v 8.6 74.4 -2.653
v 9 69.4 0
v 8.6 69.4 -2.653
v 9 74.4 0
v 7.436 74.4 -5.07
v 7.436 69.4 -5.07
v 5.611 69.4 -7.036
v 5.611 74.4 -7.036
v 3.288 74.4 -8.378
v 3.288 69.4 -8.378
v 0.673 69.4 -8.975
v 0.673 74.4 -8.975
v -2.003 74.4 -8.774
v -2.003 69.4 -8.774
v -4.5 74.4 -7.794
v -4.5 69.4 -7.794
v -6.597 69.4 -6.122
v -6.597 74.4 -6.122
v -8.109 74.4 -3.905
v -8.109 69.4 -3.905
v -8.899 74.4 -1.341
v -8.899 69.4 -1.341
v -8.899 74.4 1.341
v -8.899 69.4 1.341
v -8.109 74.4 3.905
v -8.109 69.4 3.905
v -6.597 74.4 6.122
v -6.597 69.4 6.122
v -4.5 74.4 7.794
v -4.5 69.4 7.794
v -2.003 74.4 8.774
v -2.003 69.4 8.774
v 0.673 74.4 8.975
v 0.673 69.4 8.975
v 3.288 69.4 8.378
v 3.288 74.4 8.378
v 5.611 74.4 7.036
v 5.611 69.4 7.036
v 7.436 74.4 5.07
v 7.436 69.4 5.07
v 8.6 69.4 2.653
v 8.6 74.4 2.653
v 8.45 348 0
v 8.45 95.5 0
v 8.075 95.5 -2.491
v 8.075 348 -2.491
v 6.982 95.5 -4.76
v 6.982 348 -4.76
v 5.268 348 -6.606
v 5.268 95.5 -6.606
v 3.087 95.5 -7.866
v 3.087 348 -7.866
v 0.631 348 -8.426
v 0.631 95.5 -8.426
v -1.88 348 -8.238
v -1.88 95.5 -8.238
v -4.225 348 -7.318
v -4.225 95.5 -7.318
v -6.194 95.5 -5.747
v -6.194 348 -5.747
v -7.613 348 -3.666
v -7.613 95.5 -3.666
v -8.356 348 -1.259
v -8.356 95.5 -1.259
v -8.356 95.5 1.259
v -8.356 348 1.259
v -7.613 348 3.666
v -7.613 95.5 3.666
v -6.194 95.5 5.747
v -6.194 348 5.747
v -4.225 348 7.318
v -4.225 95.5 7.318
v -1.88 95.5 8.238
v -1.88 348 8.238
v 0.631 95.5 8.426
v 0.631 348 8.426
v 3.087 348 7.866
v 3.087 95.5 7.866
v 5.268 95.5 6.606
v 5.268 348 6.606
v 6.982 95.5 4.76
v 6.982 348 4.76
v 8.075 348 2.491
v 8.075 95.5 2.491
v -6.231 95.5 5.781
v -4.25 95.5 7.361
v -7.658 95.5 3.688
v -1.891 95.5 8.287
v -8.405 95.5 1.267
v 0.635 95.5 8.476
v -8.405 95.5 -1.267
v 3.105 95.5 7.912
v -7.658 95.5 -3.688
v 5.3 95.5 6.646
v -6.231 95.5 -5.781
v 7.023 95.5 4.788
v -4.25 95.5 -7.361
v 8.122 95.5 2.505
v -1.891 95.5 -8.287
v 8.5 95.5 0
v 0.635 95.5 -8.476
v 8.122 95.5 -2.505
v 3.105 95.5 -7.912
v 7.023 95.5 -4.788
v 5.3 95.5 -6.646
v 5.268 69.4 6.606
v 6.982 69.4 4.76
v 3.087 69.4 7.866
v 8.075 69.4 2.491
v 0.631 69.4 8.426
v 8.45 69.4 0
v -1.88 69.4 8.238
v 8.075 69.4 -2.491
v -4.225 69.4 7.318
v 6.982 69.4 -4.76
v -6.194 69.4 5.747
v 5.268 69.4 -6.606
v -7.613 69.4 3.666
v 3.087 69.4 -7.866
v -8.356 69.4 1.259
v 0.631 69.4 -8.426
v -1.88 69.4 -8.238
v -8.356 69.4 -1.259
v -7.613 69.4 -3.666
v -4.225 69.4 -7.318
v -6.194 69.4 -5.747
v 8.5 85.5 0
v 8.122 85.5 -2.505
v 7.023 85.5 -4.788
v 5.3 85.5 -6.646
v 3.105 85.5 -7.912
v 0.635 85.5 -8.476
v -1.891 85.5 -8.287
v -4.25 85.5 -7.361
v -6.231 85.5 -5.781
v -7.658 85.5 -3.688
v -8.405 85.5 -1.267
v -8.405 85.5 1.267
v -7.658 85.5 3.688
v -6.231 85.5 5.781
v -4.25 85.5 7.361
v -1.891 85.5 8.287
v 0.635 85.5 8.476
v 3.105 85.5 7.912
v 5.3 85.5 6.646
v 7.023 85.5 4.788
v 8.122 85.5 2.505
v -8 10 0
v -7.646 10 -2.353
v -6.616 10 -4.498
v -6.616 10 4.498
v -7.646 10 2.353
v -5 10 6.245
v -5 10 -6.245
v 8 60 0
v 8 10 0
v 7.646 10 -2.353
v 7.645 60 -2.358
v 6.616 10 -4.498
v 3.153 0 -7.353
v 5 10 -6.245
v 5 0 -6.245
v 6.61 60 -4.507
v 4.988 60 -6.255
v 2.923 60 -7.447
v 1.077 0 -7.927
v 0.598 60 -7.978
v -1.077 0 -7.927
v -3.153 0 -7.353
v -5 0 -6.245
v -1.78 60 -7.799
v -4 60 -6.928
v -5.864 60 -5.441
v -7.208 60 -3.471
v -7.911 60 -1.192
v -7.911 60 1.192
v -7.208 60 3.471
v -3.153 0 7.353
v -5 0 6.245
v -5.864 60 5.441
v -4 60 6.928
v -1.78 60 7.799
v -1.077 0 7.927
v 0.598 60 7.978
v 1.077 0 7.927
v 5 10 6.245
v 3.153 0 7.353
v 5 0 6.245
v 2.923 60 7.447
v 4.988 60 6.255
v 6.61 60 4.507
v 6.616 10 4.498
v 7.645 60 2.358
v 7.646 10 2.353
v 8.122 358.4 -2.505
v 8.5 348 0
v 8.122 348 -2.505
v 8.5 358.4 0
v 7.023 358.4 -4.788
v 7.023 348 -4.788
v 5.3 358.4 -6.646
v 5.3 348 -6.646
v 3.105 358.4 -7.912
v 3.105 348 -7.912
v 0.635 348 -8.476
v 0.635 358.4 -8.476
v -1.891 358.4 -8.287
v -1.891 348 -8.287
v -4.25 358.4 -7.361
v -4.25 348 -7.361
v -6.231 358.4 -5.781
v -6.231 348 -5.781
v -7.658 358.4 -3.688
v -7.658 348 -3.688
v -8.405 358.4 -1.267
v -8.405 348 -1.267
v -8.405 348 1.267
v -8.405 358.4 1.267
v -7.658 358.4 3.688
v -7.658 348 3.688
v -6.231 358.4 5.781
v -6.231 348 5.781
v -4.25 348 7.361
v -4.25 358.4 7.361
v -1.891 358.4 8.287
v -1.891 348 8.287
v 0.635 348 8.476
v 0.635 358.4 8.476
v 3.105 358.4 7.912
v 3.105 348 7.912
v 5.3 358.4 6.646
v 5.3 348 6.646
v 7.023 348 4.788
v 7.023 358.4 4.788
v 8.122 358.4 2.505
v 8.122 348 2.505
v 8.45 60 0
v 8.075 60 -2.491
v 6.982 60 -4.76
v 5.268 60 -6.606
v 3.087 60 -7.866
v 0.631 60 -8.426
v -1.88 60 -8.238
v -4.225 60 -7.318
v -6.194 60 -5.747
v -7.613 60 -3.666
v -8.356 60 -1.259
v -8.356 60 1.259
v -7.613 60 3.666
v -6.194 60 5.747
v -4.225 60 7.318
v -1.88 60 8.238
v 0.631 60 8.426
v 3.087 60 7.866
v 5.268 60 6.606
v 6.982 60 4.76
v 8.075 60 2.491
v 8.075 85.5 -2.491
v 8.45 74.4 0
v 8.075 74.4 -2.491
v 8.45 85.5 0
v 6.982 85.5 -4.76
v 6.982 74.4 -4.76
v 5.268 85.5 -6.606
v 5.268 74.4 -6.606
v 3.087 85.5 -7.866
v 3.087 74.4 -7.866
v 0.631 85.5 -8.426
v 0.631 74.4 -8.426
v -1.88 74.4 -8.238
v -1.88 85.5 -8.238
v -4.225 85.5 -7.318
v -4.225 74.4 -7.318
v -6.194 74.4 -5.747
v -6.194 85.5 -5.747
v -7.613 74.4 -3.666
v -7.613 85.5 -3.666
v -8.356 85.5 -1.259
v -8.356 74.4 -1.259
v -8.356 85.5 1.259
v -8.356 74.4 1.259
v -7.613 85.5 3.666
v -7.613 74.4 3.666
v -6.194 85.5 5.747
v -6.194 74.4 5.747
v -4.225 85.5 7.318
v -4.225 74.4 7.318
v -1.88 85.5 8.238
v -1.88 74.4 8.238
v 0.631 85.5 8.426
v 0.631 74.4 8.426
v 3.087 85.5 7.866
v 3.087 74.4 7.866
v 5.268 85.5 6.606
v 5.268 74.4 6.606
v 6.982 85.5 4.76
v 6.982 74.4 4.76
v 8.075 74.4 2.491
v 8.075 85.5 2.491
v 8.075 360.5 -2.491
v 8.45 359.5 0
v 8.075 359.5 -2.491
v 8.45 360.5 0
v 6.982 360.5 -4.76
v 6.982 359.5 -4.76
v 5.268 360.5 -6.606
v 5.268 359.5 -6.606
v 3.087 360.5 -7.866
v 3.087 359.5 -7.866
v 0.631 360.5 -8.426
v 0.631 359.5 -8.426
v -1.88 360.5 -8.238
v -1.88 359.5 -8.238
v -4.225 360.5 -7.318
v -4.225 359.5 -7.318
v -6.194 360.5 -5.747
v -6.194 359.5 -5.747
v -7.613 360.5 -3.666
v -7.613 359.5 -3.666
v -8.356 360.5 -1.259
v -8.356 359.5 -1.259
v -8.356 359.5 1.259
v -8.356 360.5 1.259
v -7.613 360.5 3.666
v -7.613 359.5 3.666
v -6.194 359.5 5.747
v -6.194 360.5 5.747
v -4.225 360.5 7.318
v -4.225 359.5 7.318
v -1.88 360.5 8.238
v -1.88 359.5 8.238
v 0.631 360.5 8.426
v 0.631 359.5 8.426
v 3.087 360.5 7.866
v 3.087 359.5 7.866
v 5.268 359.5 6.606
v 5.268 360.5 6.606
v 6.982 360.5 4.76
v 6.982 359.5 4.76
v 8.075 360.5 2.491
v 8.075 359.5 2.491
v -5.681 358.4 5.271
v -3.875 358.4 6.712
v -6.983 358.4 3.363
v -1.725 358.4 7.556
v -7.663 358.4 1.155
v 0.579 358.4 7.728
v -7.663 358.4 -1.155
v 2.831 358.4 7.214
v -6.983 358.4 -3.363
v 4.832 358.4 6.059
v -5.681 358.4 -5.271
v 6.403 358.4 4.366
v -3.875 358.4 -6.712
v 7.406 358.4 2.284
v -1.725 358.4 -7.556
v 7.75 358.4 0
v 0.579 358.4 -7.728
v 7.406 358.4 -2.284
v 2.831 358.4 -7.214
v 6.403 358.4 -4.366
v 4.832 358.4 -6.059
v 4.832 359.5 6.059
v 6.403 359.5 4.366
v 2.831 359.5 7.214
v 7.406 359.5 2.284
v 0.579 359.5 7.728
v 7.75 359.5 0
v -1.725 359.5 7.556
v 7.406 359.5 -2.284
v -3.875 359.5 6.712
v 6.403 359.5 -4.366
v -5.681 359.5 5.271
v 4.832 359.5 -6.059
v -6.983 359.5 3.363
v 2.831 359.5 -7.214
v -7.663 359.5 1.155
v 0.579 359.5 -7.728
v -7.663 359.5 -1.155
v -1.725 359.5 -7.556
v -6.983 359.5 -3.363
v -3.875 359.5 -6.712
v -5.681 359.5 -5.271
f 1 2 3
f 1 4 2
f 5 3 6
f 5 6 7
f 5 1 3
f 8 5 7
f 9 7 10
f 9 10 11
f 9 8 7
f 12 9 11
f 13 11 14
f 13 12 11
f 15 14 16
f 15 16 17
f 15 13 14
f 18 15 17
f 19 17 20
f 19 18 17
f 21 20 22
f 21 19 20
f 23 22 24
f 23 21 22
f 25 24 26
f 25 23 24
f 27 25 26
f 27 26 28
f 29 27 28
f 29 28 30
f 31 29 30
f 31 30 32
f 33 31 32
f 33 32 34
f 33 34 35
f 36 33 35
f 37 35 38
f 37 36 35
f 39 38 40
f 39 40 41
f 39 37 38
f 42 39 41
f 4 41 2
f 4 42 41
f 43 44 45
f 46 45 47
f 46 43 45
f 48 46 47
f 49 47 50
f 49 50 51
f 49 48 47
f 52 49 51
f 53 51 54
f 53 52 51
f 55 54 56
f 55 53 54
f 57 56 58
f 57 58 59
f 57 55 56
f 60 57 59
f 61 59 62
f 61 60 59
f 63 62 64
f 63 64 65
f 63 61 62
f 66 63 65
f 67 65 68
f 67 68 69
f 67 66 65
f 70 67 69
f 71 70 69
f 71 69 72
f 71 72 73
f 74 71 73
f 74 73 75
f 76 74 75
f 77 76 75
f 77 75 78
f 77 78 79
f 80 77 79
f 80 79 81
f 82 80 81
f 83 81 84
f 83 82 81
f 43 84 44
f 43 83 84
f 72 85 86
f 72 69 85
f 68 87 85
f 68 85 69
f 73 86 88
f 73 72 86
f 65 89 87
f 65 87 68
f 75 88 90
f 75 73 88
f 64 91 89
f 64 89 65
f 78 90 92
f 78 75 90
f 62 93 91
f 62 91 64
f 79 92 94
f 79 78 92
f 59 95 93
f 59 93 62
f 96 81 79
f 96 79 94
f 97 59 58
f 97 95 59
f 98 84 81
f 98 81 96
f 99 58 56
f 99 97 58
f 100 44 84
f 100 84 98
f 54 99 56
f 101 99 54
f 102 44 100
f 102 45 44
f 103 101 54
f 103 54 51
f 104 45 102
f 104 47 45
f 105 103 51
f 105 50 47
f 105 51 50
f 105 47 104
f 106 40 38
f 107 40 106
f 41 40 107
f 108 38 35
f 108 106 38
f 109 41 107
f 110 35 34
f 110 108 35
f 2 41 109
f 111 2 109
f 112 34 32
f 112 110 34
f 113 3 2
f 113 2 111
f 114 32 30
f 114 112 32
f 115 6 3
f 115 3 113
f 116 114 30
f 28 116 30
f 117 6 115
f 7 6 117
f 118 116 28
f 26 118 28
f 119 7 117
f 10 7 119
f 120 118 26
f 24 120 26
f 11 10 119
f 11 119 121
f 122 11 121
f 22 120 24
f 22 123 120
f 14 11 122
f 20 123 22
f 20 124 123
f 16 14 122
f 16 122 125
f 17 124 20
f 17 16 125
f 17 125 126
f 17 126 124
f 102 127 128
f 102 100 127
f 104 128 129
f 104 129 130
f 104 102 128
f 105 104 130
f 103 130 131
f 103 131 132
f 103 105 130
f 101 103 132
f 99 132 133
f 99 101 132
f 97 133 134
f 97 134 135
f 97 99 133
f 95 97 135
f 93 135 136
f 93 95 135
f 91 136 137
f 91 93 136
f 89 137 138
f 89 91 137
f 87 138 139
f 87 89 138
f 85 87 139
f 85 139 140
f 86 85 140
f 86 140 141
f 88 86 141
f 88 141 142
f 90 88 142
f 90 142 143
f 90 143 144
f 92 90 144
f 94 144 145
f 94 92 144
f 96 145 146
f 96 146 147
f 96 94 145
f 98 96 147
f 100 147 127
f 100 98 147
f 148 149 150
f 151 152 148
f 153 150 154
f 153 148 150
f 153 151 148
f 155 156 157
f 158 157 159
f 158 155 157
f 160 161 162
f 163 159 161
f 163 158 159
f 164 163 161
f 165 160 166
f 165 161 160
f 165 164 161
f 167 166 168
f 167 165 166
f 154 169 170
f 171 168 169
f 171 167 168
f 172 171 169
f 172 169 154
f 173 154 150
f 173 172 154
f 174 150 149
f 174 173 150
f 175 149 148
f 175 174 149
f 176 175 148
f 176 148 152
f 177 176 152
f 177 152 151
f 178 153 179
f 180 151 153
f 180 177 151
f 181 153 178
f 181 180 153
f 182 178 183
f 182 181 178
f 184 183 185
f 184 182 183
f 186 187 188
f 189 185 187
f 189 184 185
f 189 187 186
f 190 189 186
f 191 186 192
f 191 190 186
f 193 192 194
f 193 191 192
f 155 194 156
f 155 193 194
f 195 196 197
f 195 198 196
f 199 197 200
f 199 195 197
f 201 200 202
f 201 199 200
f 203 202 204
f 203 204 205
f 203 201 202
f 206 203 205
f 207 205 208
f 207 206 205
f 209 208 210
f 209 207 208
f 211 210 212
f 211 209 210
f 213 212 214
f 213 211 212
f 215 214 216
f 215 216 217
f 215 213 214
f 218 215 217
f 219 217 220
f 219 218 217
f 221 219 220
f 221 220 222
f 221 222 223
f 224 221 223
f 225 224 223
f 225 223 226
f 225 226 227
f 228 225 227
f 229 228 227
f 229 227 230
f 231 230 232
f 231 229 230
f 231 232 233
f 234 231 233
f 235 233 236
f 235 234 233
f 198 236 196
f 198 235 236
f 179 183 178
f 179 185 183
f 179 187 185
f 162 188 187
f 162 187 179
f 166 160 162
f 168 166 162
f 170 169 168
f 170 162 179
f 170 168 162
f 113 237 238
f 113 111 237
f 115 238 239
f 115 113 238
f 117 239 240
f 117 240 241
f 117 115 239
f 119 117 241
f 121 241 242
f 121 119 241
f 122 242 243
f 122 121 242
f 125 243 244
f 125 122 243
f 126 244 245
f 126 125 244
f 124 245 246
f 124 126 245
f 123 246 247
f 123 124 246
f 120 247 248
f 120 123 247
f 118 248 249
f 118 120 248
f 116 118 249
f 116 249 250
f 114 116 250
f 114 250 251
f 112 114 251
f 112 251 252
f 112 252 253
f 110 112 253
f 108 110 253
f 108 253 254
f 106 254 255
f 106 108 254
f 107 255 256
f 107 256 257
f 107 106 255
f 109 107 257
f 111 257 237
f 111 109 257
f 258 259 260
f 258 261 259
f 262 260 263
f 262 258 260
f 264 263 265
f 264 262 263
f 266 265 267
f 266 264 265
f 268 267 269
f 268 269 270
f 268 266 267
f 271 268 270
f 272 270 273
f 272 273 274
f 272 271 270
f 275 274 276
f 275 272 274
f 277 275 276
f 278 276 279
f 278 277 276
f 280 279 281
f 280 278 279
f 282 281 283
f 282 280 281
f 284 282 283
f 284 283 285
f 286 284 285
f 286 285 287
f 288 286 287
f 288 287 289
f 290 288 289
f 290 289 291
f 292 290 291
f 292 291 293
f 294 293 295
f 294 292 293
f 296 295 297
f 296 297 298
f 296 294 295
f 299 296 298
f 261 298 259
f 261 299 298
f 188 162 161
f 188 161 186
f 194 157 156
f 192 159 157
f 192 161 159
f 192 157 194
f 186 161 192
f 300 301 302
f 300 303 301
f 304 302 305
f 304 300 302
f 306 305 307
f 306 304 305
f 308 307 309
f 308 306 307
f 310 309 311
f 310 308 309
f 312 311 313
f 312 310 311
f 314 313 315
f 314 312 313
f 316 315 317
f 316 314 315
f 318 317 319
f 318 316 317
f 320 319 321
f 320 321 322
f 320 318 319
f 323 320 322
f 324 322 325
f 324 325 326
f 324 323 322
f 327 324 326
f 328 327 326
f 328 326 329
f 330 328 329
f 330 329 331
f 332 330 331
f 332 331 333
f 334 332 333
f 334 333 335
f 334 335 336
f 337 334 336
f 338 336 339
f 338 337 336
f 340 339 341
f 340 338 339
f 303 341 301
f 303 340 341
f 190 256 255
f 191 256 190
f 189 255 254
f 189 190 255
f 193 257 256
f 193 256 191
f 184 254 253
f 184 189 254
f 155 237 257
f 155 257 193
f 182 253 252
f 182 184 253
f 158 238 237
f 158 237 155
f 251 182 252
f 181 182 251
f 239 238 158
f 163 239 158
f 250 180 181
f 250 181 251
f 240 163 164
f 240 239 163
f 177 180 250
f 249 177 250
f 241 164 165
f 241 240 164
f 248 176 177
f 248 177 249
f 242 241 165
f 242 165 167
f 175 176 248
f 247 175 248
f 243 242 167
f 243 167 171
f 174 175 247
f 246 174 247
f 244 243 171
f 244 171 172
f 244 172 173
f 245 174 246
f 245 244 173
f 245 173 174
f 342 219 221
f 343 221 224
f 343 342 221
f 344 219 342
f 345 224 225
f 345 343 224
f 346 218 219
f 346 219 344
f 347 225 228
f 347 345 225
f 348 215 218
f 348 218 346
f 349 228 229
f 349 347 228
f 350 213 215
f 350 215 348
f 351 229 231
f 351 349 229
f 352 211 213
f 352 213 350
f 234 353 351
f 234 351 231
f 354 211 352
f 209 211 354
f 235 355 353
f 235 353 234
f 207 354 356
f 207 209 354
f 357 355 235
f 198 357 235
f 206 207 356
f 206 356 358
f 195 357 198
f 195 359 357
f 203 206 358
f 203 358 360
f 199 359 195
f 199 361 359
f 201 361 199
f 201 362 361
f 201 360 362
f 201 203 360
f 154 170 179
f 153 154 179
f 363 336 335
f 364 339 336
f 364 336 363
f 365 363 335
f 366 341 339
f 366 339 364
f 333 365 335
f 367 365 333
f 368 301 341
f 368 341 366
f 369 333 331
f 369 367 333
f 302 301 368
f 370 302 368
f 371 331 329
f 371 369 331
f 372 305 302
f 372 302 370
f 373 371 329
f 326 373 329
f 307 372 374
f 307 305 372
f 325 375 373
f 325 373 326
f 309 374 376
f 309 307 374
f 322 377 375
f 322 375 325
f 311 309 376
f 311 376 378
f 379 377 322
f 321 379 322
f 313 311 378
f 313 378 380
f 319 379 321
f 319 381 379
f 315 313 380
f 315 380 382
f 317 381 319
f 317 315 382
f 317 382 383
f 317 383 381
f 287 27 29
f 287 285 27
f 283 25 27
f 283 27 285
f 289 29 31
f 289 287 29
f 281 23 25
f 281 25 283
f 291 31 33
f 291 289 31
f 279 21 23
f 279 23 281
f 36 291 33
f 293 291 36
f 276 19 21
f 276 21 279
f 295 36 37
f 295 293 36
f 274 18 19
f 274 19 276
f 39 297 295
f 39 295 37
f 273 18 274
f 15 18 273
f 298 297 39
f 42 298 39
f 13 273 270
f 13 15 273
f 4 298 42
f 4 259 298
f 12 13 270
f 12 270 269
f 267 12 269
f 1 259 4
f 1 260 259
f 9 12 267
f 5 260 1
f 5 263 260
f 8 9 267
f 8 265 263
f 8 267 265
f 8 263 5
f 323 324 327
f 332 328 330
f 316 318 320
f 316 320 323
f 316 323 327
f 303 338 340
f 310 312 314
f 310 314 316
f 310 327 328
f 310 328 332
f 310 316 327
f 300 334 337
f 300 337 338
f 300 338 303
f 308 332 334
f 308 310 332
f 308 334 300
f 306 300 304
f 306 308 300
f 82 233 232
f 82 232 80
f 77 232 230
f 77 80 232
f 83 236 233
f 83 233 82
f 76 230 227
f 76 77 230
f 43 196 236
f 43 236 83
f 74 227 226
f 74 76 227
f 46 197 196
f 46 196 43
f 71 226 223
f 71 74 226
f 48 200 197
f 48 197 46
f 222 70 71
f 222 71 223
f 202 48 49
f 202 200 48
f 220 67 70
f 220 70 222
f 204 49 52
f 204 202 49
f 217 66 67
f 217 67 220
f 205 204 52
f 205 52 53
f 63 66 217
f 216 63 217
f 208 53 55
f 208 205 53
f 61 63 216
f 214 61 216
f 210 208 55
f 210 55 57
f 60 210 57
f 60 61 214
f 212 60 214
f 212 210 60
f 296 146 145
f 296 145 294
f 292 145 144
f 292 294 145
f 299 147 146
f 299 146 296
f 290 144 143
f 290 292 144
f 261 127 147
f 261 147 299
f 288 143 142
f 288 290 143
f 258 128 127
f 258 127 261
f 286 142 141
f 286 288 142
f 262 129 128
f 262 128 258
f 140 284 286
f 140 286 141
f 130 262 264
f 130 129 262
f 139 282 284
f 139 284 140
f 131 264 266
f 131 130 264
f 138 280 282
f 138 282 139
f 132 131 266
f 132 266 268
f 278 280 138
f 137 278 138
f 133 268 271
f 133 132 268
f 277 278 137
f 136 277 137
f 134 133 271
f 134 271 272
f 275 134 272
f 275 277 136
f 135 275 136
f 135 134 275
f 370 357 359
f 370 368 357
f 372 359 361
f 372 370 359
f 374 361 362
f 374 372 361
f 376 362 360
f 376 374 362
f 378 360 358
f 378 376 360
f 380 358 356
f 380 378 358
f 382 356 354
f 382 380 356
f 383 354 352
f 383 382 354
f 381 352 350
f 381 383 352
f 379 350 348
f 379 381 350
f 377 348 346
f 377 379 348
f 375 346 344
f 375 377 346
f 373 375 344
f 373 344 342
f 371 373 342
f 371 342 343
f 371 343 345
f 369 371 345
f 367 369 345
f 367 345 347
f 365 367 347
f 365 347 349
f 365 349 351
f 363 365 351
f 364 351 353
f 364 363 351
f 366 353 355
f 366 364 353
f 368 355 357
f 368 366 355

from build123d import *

# Parameters (mm, degrees)
ESQUISSE2_OUTSIDE_W   = 92.28
ESQUISSE2_OUTSIDE_H   = 92.28
ESQUISSE2_OUTSIDE_W_2 = 10
ESQUISSE2_OUTSIDE_H_2 = 24.610755802
EXTRUSION1_DEPTH      = 10


with BuildPart() as part:
    # Esquisse1 → Révolution1 (revolve)
    with BuildSketch(Plane.XY):
        Polygon((0, 0), (8, 0), (8, 60), (8.45, 60), (8.45, 69.4), (9, 69.4), (9, 74.4), (8.45, 74.4), (8.45, 85.5), (8.5, 85.5), (8.5, 95.5), (8.45, 95.5), (8.45, 348), (8.5, 348), (8.5, 358.4), (7.75, 358.4), (7.75, 359.5), (8.45, 359.5), (8.45, 360.5), (0, 360.5), align=None)
    revolve(axis=Axis((0, 0, 0), (0, 1, 0)))

    # Esquisse2 outside → Extrusion1 (cut)
    with BuildSketch(Plane.XZ):
        Rectangle(ESQUISSE2_OUTSIDE_W, ESQUISSE2_OUTSIDE_H)
        Rectangle(ESQUISSE2_OUTSIDE_W_2, ESQUISSE2_OUTSIDE_H_2, mode=Mode.SUBTRACT)
    extrude(amount=-EXTRUSION1_DEPTH, mode=Mode.SUBTRACT)


solid = part.part
